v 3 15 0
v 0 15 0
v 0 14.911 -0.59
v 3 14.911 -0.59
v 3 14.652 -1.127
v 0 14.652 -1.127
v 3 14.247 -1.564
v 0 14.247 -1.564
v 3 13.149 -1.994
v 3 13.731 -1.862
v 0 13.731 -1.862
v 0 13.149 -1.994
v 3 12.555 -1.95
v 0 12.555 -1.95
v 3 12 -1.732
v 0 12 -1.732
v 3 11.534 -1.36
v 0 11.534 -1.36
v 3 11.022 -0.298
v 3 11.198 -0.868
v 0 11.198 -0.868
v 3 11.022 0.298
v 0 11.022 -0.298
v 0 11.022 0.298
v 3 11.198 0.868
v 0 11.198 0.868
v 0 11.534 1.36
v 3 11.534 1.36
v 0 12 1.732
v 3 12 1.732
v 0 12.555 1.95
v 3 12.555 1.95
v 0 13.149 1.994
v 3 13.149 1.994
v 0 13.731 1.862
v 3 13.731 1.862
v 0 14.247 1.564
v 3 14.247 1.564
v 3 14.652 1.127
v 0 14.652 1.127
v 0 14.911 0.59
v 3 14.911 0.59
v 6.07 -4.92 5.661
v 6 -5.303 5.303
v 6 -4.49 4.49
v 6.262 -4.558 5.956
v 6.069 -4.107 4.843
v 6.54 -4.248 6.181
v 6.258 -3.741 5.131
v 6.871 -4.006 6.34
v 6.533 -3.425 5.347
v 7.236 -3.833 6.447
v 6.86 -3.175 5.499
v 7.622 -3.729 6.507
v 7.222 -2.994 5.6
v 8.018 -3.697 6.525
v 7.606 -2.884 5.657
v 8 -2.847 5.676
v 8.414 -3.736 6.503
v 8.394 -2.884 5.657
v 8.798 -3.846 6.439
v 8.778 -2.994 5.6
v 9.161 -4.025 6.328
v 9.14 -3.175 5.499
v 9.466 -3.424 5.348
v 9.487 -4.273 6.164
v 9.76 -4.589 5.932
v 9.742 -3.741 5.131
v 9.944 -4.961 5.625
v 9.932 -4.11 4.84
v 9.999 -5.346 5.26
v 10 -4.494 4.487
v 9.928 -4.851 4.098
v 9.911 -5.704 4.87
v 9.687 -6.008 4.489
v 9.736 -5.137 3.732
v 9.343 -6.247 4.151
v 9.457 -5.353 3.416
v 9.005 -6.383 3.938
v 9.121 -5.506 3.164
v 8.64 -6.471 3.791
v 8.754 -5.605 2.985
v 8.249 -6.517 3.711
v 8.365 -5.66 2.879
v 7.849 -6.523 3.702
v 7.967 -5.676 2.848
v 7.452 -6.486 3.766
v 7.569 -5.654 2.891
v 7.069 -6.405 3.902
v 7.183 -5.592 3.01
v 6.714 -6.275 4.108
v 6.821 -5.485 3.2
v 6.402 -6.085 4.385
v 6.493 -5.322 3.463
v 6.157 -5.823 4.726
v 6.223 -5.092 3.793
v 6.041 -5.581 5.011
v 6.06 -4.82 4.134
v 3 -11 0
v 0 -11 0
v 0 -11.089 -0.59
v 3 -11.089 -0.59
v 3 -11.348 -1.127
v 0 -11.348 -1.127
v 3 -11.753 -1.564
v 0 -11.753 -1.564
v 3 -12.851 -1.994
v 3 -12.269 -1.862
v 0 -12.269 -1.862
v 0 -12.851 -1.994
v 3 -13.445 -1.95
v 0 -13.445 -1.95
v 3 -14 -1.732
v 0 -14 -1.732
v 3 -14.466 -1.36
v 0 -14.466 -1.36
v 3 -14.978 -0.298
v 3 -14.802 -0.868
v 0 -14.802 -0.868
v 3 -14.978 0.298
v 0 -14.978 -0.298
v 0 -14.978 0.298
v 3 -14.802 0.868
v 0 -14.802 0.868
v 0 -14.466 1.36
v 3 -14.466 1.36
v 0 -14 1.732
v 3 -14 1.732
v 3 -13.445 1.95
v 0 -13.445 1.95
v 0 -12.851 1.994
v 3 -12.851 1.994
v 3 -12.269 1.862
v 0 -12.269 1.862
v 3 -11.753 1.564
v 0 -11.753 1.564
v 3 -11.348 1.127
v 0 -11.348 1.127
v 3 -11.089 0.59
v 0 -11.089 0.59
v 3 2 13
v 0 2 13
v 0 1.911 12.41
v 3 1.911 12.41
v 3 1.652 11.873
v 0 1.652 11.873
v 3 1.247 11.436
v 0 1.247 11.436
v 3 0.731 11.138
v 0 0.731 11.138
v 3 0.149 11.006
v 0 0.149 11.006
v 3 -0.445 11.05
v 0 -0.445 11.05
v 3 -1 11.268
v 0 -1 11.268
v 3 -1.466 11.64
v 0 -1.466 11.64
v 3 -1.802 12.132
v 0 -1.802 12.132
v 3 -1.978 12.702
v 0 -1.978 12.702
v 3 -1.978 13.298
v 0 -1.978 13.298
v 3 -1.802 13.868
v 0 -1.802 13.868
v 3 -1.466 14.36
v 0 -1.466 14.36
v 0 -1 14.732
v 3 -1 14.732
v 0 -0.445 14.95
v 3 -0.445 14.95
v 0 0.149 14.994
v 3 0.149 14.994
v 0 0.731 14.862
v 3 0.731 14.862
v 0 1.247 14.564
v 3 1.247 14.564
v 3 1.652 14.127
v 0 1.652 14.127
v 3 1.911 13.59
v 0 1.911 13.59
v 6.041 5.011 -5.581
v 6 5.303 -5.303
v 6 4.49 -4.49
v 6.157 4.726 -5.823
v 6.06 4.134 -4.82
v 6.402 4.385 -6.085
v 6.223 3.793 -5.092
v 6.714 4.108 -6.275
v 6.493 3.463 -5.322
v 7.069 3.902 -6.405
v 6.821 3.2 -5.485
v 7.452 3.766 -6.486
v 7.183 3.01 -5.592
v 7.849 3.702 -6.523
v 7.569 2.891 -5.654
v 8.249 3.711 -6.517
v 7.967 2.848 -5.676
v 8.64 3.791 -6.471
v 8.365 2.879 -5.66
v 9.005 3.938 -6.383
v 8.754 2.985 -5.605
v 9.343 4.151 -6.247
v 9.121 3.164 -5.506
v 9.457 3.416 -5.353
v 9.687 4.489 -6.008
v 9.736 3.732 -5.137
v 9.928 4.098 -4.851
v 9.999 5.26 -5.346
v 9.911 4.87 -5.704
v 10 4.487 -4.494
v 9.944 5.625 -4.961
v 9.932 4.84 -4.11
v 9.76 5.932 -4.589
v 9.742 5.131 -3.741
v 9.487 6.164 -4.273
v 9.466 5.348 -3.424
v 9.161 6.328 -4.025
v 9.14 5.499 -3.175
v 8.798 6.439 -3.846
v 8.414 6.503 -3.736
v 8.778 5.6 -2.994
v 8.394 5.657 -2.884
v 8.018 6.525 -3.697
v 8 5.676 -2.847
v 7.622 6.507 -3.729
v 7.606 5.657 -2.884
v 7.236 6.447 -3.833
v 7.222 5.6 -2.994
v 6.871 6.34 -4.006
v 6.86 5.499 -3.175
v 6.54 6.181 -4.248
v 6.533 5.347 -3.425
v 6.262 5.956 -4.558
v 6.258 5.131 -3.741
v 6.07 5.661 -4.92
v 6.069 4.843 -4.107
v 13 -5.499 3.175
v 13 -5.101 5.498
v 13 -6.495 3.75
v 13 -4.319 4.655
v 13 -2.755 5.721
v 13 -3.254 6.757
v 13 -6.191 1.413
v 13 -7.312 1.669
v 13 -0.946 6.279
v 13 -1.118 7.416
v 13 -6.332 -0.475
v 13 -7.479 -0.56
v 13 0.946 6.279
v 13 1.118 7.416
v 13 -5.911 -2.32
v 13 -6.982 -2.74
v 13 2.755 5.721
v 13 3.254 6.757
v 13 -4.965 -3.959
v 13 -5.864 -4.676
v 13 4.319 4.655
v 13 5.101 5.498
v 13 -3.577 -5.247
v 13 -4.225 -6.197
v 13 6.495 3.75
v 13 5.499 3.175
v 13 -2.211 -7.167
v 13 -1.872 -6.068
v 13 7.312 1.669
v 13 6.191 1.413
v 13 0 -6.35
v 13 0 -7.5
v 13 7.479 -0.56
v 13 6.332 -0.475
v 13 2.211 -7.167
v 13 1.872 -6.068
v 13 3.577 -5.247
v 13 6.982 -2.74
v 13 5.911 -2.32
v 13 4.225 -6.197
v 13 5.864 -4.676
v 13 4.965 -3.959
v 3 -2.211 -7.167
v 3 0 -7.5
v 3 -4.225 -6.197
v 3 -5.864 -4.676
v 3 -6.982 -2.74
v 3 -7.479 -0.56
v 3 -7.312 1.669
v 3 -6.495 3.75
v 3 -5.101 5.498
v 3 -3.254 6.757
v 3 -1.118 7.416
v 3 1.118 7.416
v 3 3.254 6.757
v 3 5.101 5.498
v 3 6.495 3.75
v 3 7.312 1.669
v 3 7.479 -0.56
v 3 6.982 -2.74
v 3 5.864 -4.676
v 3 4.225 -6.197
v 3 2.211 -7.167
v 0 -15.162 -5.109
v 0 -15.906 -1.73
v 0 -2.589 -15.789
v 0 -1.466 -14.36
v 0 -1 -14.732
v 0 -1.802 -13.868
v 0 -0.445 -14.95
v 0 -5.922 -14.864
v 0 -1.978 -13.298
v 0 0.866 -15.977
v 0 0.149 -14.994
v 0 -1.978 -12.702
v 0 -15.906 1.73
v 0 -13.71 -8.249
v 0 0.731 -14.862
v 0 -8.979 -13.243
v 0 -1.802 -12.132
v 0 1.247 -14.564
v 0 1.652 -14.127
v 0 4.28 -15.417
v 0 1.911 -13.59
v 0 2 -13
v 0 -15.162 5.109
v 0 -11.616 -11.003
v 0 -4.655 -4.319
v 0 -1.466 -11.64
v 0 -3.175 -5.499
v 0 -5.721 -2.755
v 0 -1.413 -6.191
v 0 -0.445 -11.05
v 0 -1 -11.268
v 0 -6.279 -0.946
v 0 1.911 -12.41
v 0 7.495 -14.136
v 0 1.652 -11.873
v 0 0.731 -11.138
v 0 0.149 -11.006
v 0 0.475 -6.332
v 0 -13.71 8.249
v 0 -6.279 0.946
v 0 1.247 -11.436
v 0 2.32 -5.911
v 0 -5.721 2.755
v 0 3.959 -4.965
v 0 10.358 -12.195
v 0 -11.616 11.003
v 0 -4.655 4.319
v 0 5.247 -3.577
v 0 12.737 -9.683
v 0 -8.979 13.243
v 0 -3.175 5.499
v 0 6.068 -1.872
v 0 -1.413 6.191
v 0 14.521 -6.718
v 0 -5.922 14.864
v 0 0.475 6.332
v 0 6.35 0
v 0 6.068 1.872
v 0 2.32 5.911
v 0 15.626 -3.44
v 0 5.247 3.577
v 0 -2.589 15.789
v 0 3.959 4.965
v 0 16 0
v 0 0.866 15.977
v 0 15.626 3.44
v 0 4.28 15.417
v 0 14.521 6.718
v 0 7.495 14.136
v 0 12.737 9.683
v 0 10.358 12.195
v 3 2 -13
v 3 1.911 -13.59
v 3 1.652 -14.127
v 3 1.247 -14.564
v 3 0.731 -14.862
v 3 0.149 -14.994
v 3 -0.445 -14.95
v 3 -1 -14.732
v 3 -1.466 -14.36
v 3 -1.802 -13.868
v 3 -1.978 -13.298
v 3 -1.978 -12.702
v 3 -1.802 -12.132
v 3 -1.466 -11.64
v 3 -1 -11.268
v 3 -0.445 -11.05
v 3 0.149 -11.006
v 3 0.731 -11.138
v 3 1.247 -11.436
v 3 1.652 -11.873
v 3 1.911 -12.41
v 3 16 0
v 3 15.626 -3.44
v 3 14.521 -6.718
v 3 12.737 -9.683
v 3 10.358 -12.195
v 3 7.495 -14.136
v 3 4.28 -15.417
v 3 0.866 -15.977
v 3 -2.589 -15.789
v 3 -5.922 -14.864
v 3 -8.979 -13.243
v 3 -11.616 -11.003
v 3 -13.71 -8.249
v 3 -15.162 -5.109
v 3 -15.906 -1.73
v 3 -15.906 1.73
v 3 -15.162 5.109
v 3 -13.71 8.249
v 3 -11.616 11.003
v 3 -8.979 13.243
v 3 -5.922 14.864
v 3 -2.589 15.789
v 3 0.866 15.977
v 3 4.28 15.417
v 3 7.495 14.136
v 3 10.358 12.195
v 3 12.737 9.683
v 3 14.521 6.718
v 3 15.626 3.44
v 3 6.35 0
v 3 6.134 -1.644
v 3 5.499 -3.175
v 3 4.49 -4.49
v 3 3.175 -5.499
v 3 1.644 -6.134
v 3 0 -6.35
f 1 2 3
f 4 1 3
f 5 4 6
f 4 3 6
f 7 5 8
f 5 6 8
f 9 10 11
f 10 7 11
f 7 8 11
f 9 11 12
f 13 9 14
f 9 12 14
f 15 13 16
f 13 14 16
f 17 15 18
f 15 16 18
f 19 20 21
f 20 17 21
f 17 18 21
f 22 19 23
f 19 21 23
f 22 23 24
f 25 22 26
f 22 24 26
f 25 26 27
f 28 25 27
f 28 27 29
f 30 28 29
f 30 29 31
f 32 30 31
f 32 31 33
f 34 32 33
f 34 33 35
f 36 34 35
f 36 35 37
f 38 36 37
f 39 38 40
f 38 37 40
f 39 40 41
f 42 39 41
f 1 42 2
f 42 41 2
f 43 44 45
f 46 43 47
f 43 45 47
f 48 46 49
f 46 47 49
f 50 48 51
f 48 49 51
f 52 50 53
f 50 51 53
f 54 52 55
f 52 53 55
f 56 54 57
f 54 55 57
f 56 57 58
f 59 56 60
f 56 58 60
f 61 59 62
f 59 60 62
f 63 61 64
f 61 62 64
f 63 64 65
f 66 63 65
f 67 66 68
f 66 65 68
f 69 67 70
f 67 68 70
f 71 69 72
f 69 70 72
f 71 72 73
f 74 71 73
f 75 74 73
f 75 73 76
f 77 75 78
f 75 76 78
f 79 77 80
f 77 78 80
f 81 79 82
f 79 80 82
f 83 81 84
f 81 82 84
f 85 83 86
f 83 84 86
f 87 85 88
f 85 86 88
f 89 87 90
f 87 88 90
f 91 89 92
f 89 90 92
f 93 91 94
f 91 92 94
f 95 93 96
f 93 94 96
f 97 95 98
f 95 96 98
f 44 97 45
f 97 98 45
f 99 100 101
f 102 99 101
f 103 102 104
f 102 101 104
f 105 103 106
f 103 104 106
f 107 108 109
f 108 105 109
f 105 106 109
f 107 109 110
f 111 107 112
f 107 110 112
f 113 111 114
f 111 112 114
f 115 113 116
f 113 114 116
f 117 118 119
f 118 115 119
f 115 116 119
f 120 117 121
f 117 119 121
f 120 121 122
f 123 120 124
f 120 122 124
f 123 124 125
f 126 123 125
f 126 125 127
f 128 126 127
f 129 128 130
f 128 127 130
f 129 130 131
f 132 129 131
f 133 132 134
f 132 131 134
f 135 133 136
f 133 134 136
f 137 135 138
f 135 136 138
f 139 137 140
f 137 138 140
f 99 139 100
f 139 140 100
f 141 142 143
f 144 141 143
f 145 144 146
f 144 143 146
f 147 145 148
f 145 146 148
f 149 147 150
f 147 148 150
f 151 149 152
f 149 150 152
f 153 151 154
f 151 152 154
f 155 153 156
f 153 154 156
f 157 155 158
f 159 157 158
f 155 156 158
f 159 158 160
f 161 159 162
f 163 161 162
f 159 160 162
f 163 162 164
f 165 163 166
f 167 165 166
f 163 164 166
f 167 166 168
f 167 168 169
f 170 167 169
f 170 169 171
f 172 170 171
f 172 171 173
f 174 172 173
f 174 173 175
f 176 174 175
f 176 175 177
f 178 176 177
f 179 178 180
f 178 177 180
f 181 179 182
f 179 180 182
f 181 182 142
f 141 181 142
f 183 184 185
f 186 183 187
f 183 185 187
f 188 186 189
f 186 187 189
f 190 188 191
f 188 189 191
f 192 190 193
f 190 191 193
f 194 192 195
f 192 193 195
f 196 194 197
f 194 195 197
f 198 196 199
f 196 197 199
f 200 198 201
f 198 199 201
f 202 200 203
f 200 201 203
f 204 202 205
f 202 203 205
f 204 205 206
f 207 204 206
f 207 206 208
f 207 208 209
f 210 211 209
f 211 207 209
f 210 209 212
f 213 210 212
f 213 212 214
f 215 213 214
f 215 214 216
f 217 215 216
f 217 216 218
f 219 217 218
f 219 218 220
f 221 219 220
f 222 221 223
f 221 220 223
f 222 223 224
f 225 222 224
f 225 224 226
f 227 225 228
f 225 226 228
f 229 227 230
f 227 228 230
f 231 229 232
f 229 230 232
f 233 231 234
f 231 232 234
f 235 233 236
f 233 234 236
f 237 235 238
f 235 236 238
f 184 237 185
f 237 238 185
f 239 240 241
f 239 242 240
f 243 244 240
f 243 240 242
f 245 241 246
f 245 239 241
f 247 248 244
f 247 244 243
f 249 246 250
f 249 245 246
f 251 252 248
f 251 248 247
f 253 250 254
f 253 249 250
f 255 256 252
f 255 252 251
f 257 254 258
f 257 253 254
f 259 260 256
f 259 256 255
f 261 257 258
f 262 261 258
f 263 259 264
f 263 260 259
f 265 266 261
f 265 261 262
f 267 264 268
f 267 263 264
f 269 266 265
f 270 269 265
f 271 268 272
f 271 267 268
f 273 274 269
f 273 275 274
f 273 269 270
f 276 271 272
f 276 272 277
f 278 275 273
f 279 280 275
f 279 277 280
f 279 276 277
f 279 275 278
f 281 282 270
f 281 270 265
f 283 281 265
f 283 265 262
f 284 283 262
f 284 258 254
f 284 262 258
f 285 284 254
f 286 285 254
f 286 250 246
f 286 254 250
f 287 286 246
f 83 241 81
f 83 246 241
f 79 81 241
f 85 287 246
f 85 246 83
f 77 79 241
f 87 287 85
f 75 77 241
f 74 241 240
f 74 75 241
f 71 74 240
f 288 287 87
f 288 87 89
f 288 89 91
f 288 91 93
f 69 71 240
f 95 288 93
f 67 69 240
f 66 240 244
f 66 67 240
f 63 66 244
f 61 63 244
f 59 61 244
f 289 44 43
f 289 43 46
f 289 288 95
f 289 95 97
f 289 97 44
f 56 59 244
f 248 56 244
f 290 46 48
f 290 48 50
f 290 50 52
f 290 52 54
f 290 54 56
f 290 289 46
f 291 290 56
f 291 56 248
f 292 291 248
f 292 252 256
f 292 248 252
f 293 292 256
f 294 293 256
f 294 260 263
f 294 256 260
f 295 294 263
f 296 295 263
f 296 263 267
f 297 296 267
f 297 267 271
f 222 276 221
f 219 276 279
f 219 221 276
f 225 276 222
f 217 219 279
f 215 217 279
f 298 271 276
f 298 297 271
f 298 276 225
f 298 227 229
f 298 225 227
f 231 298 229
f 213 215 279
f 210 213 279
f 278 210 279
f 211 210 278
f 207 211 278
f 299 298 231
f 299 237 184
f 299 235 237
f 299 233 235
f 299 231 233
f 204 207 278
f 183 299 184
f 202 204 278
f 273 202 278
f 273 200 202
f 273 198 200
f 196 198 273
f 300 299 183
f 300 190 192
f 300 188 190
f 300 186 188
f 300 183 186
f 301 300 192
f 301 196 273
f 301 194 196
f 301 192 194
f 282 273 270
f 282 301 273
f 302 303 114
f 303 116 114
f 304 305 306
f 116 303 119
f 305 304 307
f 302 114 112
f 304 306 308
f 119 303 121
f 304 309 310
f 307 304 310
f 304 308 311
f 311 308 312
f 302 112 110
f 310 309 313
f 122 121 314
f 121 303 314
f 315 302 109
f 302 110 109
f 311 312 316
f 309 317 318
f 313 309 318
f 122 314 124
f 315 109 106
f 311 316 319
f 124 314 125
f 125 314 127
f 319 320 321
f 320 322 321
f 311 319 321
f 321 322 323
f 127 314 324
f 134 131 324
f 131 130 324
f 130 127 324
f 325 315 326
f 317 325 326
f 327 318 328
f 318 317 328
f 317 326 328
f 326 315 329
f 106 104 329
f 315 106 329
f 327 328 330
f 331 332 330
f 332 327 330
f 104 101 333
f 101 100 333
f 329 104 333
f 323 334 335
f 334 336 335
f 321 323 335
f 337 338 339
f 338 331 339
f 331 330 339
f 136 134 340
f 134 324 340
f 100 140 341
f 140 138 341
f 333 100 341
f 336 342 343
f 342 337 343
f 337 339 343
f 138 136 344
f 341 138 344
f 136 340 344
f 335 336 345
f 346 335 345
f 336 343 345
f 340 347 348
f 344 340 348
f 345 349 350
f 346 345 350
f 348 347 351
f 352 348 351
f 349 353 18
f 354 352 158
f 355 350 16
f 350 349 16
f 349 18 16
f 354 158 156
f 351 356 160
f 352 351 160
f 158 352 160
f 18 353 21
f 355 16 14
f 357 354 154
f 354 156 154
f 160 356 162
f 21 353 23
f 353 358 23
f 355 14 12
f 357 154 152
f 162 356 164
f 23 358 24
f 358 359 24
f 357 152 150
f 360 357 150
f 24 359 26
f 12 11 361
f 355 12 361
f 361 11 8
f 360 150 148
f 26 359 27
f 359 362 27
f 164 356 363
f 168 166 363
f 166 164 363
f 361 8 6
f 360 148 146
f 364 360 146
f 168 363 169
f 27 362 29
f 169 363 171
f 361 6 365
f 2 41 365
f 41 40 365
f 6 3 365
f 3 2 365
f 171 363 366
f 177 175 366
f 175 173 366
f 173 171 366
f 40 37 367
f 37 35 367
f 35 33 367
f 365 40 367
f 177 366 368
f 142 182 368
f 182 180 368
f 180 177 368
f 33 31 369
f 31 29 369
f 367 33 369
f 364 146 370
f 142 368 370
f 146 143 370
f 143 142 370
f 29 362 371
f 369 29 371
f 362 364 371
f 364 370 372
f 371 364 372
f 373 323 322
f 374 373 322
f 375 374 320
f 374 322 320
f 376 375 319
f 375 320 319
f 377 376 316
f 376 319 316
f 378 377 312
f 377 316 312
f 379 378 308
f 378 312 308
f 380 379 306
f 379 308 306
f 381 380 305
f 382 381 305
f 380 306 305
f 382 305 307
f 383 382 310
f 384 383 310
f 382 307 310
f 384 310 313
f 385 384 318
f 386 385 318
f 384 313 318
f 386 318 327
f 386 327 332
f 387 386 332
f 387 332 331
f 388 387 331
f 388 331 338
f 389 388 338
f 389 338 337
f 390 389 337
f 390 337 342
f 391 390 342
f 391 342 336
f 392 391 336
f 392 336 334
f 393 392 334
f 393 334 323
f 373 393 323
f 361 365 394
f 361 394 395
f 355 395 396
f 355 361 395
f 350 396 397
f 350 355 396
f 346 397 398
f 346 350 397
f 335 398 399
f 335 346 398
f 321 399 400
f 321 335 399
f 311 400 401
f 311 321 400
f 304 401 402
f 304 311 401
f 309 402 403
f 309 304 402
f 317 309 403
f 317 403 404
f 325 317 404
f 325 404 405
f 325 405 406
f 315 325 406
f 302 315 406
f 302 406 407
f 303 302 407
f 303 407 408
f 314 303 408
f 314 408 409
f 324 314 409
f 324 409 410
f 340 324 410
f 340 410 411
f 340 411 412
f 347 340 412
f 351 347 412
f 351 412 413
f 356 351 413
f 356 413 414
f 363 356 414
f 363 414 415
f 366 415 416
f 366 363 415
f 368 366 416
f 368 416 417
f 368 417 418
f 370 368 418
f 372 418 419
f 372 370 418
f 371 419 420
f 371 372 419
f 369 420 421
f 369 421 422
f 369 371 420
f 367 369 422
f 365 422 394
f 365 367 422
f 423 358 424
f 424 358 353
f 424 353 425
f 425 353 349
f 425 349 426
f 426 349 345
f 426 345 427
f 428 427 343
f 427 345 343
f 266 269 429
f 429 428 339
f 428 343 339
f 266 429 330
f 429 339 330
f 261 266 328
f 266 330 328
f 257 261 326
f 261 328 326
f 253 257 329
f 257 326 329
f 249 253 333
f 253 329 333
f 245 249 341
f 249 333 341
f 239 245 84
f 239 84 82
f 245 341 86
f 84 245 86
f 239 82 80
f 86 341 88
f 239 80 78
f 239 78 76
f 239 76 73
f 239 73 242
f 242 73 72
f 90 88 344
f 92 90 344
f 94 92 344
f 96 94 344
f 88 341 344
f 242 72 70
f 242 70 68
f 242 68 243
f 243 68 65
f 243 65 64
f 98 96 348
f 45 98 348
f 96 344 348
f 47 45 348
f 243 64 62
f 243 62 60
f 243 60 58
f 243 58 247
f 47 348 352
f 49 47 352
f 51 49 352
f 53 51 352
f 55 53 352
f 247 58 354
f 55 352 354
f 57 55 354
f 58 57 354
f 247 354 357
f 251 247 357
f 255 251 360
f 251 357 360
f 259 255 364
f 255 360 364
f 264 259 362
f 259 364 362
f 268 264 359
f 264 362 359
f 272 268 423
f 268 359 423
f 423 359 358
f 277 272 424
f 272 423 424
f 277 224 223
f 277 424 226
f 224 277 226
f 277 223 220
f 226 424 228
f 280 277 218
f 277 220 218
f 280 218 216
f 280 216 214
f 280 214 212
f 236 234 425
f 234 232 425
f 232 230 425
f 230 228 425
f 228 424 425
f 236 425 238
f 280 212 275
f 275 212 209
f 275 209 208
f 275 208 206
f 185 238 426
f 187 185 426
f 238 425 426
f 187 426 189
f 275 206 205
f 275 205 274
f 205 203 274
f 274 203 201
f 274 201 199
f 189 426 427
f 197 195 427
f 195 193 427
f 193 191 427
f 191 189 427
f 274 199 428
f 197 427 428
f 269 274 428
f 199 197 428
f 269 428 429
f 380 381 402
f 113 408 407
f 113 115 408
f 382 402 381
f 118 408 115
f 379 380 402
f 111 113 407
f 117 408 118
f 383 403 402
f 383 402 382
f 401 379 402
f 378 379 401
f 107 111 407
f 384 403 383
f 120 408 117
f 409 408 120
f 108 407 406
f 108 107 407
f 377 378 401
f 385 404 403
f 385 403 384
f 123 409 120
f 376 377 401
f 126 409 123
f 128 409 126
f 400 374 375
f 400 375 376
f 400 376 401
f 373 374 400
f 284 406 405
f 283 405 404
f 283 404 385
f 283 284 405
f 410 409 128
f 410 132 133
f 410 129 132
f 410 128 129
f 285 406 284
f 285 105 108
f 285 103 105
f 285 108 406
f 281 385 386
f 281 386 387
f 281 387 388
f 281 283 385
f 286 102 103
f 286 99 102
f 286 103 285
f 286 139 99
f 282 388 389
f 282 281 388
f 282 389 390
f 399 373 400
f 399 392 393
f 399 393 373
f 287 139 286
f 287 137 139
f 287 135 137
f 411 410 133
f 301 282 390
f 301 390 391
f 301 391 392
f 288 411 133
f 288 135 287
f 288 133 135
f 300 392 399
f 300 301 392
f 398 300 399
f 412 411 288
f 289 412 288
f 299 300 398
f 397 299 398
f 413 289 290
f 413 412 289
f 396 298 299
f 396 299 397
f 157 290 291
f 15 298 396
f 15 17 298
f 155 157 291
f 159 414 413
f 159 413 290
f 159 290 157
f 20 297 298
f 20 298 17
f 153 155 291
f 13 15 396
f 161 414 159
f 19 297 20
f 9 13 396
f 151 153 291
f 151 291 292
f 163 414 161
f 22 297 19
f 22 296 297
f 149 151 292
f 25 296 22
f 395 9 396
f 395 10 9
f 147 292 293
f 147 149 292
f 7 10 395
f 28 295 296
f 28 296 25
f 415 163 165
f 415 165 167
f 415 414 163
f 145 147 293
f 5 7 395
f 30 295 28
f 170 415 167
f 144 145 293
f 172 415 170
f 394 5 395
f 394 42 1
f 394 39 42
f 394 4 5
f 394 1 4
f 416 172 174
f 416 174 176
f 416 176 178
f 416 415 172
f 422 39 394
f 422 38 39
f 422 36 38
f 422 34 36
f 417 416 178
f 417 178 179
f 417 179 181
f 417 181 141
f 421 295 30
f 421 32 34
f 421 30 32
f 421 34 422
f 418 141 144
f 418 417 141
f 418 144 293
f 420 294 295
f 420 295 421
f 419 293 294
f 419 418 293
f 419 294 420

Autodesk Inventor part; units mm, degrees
ref_plane "YZ Plane" through (0, 0, 0) normal (1, 0, 0) x (0, 1, 0)
sketch "Sketch1" plane through (0, 0, 0) normal (1, 0, 0) x (0, 1, 0)
  circle A0 centre (0, 0) radius 16
  circle A1 centre (0, 13) radius 2
  circle A2 centre (0, -13) radius 2
  circle A3 centre (-13, 0) radius 2
  circle A4 centre (13, 0) radius 2
  circle A5 centre (0, -13) radius 2
  circle A6 centre (0, 13) radius 2
  circle A7 centre (13, 0) radius 2
  circle A8 centre (-13, 0) radius 2
  circle A9 centre (0, 0) radius 6.35
  line L0 (0, -22.4) -> (0, 22.4) projected
  dimension "d0" = 32
  dimension "d1" = 4
  dimension "d2" = 26
  dimension "d3" = 13
  dimension "d6" = 360
  dimension "d8" = 12.7
extrude "Extrusion1" add sketch "Sketch1" along normal blind 3 contours A0 L0 A2 A9 A1 | L0 A1 A9 A2 A0
sketch "Sketch2" plane through (3, 0, 0) normal (1, 0, 0) x (0, 0, -1)
  circle A0 centre (0, 0) radius 16 projected
  circle A1 centre (13, 0) radius 2 projected
  circle A2 centre (0, 0) radius 6.35 projected
  circle A3 centre (0, -13) radius 2 projected
  circle A4 centre (-13, 0) radius 2 projected
  circle A5 centre (0, 13) radius 2 projected
  circle A6 centre (0, 0) radius 7.5
  dimension "d11" = 15
extrude "Extrusion2" add sketch "Sketch2" along normal blind 10 contours A6
ref_plane "Work Plane1" through (0, 0, 0) normal (0, 0.7071, -0.7071) x (-1, 0, 0)
sketch "Sketch5" plane through (0, 0, 0) normal (0, 0.7071, -0.7071) x (-1, 0, 0)
  circle A0 centre (-8, 0) radius 2
  line L0 (-13, 7.5) -> (-13, -7.5) projected
  line L1 (-3, -7.5) -> (-3, 7.5) projected
  point P0 (0, 0)
  point P1 (-13, 0)
  dimension "d14" = 4
  dimension "d15" = 5
extrude "Extrusion3" cut sketch "Sketch5" along normal through all both and the other way through all
properties part number "HipCoupler"
